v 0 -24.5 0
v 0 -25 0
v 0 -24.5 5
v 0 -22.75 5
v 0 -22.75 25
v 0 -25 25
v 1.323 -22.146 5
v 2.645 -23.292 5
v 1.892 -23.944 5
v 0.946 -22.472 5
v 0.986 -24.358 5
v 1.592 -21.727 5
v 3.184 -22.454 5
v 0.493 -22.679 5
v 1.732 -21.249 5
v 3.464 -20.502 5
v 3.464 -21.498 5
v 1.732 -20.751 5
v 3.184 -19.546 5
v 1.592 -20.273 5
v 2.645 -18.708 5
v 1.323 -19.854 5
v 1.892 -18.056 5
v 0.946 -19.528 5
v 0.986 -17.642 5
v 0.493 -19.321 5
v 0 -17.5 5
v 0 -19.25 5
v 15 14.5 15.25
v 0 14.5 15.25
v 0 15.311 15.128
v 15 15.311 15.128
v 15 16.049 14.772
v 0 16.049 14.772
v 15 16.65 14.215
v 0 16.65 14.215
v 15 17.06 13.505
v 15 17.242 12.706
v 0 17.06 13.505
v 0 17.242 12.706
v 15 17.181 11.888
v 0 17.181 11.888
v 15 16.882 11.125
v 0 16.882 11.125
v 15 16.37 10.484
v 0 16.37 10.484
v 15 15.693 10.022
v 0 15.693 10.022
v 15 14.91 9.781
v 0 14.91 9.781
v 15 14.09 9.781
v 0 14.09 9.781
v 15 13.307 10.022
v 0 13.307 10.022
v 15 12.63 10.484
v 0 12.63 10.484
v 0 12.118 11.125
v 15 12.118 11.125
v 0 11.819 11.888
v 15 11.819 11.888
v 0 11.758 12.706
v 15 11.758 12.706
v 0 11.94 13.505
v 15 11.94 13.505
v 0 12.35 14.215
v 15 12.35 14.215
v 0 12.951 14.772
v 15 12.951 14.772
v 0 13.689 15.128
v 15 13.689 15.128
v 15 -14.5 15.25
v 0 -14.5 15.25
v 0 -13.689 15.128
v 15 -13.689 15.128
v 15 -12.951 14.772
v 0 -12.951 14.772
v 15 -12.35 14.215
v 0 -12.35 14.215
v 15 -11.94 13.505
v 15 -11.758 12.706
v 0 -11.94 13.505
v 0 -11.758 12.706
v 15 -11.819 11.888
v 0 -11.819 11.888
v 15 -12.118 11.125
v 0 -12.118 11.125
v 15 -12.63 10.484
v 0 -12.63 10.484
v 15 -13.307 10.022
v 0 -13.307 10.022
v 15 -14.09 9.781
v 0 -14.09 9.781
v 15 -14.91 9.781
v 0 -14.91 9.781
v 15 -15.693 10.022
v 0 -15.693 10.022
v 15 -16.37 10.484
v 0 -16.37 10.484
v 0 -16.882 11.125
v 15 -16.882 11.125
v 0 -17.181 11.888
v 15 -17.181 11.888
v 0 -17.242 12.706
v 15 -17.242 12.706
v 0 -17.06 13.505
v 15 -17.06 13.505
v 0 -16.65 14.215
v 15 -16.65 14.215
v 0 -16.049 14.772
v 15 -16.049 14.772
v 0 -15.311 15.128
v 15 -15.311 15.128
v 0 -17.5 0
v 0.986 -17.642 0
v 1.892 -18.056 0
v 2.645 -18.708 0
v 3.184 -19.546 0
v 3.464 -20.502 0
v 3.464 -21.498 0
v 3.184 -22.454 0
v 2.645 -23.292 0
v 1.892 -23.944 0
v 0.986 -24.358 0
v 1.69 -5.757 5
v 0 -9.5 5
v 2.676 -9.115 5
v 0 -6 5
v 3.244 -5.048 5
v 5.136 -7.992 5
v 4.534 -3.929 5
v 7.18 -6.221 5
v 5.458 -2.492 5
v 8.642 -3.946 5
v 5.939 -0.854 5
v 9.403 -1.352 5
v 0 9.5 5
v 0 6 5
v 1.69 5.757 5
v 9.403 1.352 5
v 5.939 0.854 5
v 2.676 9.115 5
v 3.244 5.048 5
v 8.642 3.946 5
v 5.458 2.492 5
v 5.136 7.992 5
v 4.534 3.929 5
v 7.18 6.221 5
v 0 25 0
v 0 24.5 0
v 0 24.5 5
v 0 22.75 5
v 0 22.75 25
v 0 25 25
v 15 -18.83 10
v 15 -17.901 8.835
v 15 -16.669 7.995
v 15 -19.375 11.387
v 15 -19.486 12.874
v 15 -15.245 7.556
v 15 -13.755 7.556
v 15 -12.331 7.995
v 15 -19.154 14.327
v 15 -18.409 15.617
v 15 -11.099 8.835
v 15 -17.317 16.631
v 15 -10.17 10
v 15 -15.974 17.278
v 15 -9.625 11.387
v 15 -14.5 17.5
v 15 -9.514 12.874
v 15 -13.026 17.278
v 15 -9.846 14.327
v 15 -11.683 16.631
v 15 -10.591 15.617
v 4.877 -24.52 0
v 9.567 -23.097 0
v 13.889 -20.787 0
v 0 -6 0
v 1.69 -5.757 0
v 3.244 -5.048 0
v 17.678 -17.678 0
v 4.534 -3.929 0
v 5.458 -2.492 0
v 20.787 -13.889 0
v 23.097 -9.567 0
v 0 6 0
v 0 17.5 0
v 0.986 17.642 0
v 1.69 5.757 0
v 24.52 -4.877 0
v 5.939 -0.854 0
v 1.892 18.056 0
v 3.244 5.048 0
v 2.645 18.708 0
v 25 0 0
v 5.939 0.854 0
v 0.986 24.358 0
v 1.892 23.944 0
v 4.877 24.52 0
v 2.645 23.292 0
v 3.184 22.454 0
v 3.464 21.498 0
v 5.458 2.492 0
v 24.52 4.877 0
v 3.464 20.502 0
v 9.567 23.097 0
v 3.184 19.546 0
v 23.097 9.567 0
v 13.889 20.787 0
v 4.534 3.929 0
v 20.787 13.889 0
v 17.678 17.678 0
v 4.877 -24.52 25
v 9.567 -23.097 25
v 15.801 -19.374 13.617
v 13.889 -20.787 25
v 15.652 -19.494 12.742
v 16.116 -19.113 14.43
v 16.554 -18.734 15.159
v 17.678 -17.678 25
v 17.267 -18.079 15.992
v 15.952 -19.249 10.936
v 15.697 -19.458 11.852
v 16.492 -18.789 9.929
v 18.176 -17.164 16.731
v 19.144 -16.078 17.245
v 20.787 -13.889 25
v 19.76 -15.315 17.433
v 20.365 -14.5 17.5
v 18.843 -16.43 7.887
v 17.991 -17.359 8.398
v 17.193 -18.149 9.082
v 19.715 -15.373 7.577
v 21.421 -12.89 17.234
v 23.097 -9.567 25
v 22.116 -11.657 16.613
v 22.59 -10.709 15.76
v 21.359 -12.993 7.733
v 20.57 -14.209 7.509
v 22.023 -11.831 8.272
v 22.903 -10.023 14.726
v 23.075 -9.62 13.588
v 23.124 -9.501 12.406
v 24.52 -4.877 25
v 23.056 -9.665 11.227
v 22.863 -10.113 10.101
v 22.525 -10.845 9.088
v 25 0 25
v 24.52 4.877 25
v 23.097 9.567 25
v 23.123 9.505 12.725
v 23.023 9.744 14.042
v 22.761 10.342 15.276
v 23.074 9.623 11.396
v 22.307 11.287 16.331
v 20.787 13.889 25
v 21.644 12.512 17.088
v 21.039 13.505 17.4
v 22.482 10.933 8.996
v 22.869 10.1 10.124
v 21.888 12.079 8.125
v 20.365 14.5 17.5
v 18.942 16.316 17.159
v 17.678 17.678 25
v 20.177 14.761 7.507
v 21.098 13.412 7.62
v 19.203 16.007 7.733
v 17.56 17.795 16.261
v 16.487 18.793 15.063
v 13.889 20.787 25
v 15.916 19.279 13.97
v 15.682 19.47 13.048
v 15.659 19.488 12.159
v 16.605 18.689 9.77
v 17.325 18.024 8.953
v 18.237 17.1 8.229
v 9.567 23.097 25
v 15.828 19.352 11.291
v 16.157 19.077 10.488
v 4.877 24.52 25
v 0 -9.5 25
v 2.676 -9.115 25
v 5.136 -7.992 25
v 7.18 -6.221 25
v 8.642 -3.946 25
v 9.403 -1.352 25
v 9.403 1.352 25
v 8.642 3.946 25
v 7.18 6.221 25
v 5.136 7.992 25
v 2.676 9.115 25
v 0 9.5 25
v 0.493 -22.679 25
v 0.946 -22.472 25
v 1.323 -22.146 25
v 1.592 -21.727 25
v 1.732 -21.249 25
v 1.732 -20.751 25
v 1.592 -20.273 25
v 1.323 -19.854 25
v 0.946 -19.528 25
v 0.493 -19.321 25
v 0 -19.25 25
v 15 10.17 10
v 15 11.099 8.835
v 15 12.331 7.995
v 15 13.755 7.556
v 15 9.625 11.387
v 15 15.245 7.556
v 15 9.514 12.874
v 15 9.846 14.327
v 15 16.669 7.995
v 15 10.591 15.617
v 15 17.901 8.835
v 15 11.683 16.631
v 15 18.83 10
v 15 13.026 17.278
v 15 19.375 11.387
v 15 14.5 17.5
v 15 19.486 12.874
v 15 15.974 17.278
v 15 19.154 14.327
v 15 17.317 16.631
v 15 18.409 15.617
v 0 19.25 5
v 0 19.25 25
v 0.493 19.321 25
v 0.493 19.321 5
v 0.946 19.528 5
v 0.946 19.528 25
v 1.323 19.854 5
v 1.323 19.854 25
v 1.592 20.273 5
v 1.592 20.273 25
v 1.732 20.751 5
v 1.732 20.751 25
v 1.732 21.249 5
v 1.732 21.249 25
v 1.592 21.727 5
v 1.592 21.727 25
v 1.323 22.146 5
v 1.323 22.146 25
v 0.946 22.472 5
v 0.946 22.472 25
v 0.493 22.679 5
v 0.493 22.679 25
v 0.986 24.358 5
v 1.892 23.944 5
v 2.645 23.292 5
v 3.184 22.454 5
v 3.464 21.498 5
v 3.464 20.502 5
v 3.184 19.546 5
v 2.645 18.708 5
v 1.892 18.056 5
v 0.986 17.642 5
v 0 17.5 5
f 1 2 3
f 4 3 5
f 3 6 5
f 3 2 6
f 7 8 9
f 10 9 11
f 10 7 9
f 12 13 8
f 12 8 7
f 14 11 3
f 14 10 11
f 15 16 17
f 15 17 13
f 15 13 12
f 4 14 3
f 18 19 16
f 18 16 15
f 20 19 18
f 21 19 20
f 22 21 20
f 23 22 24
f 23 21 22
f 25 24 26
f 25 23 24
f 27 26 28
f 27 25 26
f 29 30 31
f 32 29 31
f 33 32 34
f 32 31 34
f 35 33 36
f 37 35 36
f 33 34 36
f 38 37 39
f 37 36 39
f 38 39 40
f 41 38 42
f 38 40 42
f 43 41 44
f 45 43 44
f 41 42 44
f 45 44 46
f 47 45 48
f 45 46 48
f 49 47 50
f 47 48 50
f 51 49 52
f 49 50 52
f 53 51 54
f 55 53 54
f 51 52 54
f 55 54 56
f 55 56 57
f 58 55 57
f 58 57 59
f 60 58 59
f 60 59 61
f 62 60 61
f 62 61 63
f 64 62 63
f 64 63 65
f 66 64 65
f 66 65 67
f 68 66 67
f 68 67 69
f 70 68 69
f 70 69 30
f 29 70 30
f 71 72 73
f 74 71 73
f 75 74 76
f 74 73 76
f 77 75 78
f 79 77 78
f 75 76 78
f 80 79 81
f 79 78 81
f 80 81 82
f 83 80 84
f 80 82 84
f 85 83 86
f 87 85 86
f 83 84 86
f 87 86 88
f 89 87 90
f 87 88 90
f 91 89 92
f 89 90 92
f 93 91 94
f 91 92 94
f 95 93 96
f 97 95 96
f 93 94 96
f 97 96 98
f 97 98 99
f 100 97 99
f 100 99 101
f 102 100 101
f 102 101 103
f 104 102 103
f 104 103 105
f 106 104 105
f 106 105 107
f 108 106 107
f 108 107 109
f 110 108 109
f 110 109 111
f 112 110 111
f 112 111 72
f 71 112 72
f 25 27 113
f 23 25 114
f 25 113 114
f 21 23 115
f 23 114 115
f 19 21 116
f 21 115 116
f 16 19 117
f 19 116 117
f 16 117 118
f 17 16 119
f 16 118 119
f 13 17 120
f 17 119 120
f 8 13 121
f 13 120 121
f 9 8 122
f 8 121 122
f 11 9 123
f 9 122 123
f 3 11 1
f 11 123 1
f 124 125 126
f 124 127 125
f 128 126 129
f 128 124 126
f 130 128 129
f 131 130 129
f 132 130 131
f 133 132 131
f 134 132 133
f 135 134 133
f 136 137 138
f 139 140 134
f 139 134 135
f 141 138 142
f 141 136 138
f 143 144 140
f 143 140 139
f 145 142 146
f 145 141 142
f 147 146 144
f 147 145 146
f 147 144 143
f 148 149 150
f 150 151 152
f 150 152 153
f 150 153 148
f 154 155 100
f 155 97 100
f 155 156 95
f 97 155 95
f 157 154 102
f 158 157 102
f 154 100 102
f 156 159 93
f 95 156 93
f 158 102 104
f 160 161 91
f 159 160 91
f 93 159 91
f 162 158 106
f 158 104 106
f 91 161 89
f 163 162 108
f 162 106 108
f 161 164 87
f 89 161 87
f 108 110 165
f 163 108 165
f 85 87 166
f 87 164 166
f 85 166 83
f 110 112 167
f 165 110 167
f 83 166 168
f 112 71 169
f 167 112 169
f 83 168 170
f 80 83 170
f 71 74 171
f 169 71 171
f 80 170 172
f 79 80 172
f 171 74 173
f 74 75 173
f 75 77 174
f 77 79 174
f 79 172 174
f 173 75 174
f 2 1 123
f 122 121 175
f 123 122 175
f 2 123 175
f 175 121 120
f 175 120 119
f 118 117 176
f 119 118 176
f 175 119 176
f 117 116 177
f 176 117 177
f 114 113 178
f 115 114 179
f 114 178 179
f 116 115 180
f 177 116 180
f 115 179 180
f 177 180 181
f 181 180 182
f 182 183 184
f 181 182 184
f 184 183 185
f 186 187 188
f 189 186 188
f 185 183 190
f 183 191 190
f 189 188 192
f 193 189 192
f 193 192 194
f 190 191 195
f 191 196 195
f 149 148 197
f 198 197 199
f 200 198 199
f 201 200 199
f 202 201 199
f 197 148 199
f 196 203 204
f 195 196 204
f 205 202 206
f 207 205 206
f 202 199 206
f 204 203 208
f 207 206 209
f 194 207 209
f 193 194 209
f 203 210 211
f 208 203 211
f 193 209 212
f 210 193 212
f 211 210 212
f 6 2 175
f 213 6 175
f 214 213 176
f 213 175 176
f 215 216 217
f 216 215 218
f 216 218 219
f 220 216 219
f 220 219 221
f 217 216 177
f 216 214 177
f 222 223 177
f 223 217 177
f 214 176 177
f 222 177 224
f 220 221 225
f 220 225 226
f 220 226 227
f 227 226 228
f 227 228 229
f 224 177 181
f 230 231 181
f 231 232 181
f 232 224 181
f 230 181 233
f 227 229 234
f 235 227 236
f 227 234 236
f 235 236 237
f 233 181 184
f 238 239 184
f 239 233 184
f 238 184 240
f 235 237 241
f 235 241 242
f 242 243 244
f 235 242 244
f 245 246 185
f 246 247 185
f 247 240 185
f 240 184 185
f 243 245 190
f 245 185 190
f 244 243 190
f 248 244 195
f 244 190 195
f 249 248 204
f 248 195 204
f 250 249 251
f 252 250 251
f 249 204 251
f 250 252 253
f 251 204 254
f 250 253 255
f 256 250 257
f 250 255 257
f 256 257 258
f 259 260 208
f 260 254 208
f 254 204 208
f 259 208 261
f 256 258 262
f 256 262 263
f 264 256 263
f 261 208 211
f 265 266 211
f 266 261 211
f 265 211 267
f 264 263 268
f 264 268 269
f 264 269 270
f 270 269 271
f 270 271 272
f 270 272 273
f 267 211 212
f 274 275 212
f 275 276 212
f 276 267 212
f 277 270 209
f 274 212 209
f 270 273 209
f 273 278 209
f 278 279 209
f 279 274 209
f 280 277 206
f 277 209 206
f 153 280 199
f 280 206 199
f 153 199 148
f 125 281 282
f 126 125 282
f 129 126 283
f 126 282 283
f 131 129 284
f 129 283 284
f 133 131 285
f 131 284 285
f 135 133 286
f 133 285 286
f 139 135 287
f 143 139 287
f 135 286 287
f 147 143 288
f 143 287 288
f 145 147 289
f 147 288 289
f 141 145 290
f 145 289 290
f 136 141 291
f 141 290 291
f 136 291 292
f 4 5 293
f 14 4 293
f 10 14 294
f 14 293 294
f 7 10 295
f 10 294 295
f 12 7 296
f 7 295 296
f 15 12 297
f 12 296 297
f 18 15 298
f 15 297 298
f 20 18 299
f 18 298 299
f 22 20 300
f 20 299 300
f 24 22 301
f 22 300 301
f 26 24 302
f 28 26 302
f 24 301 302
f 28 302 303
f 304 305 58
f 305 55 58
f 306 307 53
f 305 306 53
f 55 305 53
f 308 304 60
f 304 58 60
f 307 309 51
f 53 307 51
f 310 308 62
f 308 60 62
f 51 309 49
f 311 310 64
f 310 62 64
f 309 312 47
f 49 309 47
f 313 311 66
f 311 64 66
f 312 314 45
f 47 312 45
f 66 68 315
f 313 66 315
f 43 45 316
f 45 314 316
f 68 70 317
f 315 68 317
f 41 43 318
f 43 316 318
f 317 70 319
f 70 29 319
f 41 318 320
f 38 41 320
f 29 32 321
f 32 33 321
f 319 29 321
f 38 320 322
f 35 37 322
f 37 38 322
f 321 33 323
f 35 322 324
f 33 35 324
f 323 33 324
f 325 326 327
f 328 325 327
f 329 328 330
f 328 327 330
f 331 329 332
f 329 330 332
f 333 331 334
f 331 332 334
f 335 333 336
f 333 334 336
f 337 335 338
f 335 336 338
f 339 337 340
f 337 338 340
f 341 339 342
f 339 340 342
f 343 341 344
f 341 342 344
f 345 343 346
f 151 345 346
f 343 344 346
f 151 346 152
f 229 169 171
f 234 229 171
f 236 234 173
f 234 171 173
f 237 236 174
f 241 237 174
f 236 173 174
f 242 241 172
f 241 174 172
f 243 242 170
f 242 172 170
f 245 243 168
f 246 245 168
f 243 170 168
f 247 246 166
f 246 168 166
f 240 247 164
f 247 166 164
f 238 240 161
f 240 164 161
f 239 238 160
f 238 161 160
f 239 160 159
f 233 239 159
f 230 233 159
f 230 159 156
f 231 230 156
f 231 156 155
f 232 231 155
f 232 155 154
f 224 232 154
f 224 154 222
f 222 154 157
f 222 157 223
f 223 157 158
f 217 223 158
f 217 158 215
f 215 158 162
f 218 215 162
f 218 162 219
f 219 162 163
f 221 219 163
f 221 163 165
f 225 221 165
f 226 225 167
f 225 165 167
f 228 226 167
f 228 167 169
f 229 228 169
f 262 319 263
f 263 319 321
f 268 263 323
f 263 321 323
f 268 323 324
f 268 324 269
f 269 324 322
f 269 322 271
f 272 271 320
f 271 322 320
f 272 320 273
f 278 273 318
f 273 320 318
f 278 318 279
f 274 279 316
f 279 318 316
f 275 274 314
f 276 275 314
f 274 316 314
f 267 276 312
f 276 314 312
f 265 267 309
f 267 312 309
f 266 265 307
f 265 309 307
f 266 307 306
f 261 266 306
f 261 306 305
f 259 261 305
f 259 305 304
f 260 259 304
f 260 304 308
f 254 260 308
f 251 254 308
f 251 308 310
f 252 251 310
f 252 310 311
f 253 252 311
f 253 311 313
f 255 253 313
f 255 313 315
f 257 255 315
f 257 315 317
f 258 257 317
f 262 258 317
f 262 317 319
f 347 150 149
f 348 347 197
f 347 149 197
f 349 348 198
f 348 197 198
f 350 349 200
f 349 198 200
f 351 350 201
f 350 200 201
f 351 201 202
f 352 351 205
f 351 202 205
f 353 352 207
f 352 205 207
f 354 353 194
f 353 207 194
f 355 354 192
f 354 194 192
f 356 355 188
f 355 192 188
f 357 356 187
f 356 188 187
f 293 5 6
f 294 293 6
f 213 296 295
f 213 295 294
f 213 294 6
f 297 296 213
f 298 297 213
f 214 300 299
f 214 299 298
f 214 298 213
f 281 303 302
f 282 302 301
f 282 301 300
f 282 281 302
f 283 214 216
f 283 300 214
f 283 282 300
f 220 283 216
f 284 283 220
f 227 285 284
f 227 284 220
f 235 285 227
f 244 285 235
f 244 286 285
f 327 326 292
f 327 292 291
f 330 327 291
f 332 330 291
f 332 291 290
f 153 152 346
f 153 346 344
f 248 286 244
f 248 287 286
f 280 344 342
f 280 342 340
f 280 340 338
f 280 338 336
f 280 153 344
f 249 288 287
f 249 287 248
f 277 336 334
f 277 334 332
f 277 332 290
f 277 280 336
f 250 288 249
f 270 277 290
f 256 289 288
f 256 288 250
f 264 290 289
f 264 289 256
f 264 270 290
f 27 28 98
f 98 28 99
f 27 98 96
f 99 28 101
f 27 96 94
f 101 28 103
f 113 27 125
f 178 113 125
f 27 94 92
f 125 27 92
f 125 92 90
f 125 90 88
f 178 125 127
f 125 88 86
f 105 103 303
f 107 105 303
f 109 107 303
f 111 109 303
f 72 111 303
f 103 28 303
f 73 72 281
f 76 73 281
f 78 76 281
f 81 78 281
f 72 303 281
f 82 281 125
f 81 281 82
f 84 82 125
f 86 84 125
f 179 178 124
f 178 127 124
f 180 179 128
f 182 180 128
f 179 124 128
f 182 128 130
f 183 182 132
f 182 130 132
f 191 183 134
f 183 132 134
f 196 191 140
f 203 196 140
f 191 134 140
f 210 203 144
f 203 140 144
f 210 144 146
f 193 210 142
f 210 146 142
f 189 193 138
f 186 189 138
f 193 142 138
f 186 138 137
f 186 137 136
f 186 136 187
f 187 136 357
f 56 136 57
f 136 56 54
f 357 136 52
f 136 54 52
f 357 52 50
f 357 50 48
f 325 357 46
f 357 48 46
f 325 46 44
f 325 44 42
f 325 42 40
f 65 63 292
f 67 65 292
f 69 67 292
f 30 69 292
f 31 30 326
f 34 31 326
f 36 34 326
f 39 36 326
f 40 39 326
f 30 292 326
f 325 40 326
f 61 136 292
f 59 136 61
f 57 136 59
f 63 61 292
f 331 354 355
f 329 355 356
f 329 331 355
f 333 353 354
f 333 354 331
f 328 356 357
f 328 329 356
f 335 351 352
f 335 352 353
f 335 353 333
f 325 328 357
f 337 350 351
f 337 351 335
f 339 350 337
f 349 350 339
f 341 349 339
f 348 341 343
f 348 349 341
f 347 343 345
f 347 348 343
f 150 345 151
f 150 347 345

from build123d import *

# Parameters (mm, degrees)
SKETCH1_R           = 25
BOSS_EXTRUDE1_DEPTH = 25
SKETCH2_R           = 9.5
CUT_EXTRUDE1_DEPTH  = 20
SKETCH3_R           = 6
CUT_EXTRUDE2_DEPTH  = 20
SKETCH4_W           = 31.902567833
SKETCH4_H           = 50
CUT_EXTRUDE3_DEPTH  = 26
SKETCH5_R           = 2.75
CUT_EXTRUDE4_DEPTH  = 26
CUT_EXTRUDE5_START  = -15
SKETCH6_R           = 5
CUT_EXTRUDE5_DEPTH  = 20
SKETCH7_R           = 1.75
CUT_EXTRUDE6_DEPTH  = 26.0000001
SKETCH8_R           = 3.5
CUT_EXTRUDE7_DEPTH  = 5


with BuildPart() as part:
    # Sketch1 → Boss-Extrude1 (new body)
    with BuildSketch(Plane.XY):
        Circle(SKETCH1_R)
    extrude(amount=BOSS_EXTRUDE1_DEPTH)

    # Sketch2 → Cut-Extrude1 (cut)
    with BuildSketch(Plane.XY.offset(25)):
        Circle(SKETCH2_R)
    extrude(amount=-CUT_EXTRUDE1_DEPTH, mode=Mode.SUBTRACT)

    # Sketch3 → Cut-Extrude2 (cut)
    with BuildSketch(Plane.XY.offset(5)):
        Circle(SKETCH3_R)
    extrude(amount=-CUT_EXTRUDE2_DEPTH, mode=Mode.SUBTRACT)

    # Sketch4 → Cut-Extrude3 (cut, through all)
    with BuildSketch(Plane.XY.offset(25)):
        with Locations((-15.951283917, 0)):
            Rectangle(SKETCH4_W, SKETCH4_H)
    extrude(amount=-CUT_EXTRUDE3_DEPTH, mode=Mode.SUBTRACT)

    # Sketch5 → Cut-Extrude4 (cut, through all)
    with BuildSketch(Plane.ZY):
        with Locations((12.5, -14.5)):
            Circle(SKETCH5_R)
        with Locations((12.5, 14.5)):
            Circle(SKETCH5_R)
    extrude(amount=-CUT_EXTRUDE4_DEPTH, mode=Mode.SUBTRACT)

    # Sketch6 → Cut-Extrude5 (cut)
    with BuildSketch(Plane.ZY.offset(CUT_EXTRUDE5_START)):
        with Locations((12.5, 14.5)):
            Circle(SKETCH6_R)
        with Locations((12.5, -14.5)):
            Circle(SKETCH6_R)
    extrude(amount=-CUT_EXTRUDE5_DEPTH, mode=Mode.SUBTRACT)

    # Sketch7 → Cut-Extrude6 (cut, through all)
    with BuildSketch(Plane.XY.offset(25)):
        with Locations((0, 21)):
            Circle(SKETCH7_R)
        with Locations((0, -21)):
            Circle(SKETCH7_R)
    extrude(amount=-CUT_EXTRUDE6_DEPTH, mode=Mode.SUBTRACT)

    # Sketch8 → Cut-Extrude7 (cut)
    with BuildSketch(Plane(origin=(0, 0, 0), x_dir=(-1, 0, 0), z_dir=(0, 0, -1))):
        with Locations((0, 21)):
            Circle(SKETCH8_R)
        with Locations((0, -21)):
            Circle(SKETCH8_R)
    extrude(amount=-CUT_EXTRUDE7_DEPTH, mode=Mode.SUBTRACT)


solid = part.part
